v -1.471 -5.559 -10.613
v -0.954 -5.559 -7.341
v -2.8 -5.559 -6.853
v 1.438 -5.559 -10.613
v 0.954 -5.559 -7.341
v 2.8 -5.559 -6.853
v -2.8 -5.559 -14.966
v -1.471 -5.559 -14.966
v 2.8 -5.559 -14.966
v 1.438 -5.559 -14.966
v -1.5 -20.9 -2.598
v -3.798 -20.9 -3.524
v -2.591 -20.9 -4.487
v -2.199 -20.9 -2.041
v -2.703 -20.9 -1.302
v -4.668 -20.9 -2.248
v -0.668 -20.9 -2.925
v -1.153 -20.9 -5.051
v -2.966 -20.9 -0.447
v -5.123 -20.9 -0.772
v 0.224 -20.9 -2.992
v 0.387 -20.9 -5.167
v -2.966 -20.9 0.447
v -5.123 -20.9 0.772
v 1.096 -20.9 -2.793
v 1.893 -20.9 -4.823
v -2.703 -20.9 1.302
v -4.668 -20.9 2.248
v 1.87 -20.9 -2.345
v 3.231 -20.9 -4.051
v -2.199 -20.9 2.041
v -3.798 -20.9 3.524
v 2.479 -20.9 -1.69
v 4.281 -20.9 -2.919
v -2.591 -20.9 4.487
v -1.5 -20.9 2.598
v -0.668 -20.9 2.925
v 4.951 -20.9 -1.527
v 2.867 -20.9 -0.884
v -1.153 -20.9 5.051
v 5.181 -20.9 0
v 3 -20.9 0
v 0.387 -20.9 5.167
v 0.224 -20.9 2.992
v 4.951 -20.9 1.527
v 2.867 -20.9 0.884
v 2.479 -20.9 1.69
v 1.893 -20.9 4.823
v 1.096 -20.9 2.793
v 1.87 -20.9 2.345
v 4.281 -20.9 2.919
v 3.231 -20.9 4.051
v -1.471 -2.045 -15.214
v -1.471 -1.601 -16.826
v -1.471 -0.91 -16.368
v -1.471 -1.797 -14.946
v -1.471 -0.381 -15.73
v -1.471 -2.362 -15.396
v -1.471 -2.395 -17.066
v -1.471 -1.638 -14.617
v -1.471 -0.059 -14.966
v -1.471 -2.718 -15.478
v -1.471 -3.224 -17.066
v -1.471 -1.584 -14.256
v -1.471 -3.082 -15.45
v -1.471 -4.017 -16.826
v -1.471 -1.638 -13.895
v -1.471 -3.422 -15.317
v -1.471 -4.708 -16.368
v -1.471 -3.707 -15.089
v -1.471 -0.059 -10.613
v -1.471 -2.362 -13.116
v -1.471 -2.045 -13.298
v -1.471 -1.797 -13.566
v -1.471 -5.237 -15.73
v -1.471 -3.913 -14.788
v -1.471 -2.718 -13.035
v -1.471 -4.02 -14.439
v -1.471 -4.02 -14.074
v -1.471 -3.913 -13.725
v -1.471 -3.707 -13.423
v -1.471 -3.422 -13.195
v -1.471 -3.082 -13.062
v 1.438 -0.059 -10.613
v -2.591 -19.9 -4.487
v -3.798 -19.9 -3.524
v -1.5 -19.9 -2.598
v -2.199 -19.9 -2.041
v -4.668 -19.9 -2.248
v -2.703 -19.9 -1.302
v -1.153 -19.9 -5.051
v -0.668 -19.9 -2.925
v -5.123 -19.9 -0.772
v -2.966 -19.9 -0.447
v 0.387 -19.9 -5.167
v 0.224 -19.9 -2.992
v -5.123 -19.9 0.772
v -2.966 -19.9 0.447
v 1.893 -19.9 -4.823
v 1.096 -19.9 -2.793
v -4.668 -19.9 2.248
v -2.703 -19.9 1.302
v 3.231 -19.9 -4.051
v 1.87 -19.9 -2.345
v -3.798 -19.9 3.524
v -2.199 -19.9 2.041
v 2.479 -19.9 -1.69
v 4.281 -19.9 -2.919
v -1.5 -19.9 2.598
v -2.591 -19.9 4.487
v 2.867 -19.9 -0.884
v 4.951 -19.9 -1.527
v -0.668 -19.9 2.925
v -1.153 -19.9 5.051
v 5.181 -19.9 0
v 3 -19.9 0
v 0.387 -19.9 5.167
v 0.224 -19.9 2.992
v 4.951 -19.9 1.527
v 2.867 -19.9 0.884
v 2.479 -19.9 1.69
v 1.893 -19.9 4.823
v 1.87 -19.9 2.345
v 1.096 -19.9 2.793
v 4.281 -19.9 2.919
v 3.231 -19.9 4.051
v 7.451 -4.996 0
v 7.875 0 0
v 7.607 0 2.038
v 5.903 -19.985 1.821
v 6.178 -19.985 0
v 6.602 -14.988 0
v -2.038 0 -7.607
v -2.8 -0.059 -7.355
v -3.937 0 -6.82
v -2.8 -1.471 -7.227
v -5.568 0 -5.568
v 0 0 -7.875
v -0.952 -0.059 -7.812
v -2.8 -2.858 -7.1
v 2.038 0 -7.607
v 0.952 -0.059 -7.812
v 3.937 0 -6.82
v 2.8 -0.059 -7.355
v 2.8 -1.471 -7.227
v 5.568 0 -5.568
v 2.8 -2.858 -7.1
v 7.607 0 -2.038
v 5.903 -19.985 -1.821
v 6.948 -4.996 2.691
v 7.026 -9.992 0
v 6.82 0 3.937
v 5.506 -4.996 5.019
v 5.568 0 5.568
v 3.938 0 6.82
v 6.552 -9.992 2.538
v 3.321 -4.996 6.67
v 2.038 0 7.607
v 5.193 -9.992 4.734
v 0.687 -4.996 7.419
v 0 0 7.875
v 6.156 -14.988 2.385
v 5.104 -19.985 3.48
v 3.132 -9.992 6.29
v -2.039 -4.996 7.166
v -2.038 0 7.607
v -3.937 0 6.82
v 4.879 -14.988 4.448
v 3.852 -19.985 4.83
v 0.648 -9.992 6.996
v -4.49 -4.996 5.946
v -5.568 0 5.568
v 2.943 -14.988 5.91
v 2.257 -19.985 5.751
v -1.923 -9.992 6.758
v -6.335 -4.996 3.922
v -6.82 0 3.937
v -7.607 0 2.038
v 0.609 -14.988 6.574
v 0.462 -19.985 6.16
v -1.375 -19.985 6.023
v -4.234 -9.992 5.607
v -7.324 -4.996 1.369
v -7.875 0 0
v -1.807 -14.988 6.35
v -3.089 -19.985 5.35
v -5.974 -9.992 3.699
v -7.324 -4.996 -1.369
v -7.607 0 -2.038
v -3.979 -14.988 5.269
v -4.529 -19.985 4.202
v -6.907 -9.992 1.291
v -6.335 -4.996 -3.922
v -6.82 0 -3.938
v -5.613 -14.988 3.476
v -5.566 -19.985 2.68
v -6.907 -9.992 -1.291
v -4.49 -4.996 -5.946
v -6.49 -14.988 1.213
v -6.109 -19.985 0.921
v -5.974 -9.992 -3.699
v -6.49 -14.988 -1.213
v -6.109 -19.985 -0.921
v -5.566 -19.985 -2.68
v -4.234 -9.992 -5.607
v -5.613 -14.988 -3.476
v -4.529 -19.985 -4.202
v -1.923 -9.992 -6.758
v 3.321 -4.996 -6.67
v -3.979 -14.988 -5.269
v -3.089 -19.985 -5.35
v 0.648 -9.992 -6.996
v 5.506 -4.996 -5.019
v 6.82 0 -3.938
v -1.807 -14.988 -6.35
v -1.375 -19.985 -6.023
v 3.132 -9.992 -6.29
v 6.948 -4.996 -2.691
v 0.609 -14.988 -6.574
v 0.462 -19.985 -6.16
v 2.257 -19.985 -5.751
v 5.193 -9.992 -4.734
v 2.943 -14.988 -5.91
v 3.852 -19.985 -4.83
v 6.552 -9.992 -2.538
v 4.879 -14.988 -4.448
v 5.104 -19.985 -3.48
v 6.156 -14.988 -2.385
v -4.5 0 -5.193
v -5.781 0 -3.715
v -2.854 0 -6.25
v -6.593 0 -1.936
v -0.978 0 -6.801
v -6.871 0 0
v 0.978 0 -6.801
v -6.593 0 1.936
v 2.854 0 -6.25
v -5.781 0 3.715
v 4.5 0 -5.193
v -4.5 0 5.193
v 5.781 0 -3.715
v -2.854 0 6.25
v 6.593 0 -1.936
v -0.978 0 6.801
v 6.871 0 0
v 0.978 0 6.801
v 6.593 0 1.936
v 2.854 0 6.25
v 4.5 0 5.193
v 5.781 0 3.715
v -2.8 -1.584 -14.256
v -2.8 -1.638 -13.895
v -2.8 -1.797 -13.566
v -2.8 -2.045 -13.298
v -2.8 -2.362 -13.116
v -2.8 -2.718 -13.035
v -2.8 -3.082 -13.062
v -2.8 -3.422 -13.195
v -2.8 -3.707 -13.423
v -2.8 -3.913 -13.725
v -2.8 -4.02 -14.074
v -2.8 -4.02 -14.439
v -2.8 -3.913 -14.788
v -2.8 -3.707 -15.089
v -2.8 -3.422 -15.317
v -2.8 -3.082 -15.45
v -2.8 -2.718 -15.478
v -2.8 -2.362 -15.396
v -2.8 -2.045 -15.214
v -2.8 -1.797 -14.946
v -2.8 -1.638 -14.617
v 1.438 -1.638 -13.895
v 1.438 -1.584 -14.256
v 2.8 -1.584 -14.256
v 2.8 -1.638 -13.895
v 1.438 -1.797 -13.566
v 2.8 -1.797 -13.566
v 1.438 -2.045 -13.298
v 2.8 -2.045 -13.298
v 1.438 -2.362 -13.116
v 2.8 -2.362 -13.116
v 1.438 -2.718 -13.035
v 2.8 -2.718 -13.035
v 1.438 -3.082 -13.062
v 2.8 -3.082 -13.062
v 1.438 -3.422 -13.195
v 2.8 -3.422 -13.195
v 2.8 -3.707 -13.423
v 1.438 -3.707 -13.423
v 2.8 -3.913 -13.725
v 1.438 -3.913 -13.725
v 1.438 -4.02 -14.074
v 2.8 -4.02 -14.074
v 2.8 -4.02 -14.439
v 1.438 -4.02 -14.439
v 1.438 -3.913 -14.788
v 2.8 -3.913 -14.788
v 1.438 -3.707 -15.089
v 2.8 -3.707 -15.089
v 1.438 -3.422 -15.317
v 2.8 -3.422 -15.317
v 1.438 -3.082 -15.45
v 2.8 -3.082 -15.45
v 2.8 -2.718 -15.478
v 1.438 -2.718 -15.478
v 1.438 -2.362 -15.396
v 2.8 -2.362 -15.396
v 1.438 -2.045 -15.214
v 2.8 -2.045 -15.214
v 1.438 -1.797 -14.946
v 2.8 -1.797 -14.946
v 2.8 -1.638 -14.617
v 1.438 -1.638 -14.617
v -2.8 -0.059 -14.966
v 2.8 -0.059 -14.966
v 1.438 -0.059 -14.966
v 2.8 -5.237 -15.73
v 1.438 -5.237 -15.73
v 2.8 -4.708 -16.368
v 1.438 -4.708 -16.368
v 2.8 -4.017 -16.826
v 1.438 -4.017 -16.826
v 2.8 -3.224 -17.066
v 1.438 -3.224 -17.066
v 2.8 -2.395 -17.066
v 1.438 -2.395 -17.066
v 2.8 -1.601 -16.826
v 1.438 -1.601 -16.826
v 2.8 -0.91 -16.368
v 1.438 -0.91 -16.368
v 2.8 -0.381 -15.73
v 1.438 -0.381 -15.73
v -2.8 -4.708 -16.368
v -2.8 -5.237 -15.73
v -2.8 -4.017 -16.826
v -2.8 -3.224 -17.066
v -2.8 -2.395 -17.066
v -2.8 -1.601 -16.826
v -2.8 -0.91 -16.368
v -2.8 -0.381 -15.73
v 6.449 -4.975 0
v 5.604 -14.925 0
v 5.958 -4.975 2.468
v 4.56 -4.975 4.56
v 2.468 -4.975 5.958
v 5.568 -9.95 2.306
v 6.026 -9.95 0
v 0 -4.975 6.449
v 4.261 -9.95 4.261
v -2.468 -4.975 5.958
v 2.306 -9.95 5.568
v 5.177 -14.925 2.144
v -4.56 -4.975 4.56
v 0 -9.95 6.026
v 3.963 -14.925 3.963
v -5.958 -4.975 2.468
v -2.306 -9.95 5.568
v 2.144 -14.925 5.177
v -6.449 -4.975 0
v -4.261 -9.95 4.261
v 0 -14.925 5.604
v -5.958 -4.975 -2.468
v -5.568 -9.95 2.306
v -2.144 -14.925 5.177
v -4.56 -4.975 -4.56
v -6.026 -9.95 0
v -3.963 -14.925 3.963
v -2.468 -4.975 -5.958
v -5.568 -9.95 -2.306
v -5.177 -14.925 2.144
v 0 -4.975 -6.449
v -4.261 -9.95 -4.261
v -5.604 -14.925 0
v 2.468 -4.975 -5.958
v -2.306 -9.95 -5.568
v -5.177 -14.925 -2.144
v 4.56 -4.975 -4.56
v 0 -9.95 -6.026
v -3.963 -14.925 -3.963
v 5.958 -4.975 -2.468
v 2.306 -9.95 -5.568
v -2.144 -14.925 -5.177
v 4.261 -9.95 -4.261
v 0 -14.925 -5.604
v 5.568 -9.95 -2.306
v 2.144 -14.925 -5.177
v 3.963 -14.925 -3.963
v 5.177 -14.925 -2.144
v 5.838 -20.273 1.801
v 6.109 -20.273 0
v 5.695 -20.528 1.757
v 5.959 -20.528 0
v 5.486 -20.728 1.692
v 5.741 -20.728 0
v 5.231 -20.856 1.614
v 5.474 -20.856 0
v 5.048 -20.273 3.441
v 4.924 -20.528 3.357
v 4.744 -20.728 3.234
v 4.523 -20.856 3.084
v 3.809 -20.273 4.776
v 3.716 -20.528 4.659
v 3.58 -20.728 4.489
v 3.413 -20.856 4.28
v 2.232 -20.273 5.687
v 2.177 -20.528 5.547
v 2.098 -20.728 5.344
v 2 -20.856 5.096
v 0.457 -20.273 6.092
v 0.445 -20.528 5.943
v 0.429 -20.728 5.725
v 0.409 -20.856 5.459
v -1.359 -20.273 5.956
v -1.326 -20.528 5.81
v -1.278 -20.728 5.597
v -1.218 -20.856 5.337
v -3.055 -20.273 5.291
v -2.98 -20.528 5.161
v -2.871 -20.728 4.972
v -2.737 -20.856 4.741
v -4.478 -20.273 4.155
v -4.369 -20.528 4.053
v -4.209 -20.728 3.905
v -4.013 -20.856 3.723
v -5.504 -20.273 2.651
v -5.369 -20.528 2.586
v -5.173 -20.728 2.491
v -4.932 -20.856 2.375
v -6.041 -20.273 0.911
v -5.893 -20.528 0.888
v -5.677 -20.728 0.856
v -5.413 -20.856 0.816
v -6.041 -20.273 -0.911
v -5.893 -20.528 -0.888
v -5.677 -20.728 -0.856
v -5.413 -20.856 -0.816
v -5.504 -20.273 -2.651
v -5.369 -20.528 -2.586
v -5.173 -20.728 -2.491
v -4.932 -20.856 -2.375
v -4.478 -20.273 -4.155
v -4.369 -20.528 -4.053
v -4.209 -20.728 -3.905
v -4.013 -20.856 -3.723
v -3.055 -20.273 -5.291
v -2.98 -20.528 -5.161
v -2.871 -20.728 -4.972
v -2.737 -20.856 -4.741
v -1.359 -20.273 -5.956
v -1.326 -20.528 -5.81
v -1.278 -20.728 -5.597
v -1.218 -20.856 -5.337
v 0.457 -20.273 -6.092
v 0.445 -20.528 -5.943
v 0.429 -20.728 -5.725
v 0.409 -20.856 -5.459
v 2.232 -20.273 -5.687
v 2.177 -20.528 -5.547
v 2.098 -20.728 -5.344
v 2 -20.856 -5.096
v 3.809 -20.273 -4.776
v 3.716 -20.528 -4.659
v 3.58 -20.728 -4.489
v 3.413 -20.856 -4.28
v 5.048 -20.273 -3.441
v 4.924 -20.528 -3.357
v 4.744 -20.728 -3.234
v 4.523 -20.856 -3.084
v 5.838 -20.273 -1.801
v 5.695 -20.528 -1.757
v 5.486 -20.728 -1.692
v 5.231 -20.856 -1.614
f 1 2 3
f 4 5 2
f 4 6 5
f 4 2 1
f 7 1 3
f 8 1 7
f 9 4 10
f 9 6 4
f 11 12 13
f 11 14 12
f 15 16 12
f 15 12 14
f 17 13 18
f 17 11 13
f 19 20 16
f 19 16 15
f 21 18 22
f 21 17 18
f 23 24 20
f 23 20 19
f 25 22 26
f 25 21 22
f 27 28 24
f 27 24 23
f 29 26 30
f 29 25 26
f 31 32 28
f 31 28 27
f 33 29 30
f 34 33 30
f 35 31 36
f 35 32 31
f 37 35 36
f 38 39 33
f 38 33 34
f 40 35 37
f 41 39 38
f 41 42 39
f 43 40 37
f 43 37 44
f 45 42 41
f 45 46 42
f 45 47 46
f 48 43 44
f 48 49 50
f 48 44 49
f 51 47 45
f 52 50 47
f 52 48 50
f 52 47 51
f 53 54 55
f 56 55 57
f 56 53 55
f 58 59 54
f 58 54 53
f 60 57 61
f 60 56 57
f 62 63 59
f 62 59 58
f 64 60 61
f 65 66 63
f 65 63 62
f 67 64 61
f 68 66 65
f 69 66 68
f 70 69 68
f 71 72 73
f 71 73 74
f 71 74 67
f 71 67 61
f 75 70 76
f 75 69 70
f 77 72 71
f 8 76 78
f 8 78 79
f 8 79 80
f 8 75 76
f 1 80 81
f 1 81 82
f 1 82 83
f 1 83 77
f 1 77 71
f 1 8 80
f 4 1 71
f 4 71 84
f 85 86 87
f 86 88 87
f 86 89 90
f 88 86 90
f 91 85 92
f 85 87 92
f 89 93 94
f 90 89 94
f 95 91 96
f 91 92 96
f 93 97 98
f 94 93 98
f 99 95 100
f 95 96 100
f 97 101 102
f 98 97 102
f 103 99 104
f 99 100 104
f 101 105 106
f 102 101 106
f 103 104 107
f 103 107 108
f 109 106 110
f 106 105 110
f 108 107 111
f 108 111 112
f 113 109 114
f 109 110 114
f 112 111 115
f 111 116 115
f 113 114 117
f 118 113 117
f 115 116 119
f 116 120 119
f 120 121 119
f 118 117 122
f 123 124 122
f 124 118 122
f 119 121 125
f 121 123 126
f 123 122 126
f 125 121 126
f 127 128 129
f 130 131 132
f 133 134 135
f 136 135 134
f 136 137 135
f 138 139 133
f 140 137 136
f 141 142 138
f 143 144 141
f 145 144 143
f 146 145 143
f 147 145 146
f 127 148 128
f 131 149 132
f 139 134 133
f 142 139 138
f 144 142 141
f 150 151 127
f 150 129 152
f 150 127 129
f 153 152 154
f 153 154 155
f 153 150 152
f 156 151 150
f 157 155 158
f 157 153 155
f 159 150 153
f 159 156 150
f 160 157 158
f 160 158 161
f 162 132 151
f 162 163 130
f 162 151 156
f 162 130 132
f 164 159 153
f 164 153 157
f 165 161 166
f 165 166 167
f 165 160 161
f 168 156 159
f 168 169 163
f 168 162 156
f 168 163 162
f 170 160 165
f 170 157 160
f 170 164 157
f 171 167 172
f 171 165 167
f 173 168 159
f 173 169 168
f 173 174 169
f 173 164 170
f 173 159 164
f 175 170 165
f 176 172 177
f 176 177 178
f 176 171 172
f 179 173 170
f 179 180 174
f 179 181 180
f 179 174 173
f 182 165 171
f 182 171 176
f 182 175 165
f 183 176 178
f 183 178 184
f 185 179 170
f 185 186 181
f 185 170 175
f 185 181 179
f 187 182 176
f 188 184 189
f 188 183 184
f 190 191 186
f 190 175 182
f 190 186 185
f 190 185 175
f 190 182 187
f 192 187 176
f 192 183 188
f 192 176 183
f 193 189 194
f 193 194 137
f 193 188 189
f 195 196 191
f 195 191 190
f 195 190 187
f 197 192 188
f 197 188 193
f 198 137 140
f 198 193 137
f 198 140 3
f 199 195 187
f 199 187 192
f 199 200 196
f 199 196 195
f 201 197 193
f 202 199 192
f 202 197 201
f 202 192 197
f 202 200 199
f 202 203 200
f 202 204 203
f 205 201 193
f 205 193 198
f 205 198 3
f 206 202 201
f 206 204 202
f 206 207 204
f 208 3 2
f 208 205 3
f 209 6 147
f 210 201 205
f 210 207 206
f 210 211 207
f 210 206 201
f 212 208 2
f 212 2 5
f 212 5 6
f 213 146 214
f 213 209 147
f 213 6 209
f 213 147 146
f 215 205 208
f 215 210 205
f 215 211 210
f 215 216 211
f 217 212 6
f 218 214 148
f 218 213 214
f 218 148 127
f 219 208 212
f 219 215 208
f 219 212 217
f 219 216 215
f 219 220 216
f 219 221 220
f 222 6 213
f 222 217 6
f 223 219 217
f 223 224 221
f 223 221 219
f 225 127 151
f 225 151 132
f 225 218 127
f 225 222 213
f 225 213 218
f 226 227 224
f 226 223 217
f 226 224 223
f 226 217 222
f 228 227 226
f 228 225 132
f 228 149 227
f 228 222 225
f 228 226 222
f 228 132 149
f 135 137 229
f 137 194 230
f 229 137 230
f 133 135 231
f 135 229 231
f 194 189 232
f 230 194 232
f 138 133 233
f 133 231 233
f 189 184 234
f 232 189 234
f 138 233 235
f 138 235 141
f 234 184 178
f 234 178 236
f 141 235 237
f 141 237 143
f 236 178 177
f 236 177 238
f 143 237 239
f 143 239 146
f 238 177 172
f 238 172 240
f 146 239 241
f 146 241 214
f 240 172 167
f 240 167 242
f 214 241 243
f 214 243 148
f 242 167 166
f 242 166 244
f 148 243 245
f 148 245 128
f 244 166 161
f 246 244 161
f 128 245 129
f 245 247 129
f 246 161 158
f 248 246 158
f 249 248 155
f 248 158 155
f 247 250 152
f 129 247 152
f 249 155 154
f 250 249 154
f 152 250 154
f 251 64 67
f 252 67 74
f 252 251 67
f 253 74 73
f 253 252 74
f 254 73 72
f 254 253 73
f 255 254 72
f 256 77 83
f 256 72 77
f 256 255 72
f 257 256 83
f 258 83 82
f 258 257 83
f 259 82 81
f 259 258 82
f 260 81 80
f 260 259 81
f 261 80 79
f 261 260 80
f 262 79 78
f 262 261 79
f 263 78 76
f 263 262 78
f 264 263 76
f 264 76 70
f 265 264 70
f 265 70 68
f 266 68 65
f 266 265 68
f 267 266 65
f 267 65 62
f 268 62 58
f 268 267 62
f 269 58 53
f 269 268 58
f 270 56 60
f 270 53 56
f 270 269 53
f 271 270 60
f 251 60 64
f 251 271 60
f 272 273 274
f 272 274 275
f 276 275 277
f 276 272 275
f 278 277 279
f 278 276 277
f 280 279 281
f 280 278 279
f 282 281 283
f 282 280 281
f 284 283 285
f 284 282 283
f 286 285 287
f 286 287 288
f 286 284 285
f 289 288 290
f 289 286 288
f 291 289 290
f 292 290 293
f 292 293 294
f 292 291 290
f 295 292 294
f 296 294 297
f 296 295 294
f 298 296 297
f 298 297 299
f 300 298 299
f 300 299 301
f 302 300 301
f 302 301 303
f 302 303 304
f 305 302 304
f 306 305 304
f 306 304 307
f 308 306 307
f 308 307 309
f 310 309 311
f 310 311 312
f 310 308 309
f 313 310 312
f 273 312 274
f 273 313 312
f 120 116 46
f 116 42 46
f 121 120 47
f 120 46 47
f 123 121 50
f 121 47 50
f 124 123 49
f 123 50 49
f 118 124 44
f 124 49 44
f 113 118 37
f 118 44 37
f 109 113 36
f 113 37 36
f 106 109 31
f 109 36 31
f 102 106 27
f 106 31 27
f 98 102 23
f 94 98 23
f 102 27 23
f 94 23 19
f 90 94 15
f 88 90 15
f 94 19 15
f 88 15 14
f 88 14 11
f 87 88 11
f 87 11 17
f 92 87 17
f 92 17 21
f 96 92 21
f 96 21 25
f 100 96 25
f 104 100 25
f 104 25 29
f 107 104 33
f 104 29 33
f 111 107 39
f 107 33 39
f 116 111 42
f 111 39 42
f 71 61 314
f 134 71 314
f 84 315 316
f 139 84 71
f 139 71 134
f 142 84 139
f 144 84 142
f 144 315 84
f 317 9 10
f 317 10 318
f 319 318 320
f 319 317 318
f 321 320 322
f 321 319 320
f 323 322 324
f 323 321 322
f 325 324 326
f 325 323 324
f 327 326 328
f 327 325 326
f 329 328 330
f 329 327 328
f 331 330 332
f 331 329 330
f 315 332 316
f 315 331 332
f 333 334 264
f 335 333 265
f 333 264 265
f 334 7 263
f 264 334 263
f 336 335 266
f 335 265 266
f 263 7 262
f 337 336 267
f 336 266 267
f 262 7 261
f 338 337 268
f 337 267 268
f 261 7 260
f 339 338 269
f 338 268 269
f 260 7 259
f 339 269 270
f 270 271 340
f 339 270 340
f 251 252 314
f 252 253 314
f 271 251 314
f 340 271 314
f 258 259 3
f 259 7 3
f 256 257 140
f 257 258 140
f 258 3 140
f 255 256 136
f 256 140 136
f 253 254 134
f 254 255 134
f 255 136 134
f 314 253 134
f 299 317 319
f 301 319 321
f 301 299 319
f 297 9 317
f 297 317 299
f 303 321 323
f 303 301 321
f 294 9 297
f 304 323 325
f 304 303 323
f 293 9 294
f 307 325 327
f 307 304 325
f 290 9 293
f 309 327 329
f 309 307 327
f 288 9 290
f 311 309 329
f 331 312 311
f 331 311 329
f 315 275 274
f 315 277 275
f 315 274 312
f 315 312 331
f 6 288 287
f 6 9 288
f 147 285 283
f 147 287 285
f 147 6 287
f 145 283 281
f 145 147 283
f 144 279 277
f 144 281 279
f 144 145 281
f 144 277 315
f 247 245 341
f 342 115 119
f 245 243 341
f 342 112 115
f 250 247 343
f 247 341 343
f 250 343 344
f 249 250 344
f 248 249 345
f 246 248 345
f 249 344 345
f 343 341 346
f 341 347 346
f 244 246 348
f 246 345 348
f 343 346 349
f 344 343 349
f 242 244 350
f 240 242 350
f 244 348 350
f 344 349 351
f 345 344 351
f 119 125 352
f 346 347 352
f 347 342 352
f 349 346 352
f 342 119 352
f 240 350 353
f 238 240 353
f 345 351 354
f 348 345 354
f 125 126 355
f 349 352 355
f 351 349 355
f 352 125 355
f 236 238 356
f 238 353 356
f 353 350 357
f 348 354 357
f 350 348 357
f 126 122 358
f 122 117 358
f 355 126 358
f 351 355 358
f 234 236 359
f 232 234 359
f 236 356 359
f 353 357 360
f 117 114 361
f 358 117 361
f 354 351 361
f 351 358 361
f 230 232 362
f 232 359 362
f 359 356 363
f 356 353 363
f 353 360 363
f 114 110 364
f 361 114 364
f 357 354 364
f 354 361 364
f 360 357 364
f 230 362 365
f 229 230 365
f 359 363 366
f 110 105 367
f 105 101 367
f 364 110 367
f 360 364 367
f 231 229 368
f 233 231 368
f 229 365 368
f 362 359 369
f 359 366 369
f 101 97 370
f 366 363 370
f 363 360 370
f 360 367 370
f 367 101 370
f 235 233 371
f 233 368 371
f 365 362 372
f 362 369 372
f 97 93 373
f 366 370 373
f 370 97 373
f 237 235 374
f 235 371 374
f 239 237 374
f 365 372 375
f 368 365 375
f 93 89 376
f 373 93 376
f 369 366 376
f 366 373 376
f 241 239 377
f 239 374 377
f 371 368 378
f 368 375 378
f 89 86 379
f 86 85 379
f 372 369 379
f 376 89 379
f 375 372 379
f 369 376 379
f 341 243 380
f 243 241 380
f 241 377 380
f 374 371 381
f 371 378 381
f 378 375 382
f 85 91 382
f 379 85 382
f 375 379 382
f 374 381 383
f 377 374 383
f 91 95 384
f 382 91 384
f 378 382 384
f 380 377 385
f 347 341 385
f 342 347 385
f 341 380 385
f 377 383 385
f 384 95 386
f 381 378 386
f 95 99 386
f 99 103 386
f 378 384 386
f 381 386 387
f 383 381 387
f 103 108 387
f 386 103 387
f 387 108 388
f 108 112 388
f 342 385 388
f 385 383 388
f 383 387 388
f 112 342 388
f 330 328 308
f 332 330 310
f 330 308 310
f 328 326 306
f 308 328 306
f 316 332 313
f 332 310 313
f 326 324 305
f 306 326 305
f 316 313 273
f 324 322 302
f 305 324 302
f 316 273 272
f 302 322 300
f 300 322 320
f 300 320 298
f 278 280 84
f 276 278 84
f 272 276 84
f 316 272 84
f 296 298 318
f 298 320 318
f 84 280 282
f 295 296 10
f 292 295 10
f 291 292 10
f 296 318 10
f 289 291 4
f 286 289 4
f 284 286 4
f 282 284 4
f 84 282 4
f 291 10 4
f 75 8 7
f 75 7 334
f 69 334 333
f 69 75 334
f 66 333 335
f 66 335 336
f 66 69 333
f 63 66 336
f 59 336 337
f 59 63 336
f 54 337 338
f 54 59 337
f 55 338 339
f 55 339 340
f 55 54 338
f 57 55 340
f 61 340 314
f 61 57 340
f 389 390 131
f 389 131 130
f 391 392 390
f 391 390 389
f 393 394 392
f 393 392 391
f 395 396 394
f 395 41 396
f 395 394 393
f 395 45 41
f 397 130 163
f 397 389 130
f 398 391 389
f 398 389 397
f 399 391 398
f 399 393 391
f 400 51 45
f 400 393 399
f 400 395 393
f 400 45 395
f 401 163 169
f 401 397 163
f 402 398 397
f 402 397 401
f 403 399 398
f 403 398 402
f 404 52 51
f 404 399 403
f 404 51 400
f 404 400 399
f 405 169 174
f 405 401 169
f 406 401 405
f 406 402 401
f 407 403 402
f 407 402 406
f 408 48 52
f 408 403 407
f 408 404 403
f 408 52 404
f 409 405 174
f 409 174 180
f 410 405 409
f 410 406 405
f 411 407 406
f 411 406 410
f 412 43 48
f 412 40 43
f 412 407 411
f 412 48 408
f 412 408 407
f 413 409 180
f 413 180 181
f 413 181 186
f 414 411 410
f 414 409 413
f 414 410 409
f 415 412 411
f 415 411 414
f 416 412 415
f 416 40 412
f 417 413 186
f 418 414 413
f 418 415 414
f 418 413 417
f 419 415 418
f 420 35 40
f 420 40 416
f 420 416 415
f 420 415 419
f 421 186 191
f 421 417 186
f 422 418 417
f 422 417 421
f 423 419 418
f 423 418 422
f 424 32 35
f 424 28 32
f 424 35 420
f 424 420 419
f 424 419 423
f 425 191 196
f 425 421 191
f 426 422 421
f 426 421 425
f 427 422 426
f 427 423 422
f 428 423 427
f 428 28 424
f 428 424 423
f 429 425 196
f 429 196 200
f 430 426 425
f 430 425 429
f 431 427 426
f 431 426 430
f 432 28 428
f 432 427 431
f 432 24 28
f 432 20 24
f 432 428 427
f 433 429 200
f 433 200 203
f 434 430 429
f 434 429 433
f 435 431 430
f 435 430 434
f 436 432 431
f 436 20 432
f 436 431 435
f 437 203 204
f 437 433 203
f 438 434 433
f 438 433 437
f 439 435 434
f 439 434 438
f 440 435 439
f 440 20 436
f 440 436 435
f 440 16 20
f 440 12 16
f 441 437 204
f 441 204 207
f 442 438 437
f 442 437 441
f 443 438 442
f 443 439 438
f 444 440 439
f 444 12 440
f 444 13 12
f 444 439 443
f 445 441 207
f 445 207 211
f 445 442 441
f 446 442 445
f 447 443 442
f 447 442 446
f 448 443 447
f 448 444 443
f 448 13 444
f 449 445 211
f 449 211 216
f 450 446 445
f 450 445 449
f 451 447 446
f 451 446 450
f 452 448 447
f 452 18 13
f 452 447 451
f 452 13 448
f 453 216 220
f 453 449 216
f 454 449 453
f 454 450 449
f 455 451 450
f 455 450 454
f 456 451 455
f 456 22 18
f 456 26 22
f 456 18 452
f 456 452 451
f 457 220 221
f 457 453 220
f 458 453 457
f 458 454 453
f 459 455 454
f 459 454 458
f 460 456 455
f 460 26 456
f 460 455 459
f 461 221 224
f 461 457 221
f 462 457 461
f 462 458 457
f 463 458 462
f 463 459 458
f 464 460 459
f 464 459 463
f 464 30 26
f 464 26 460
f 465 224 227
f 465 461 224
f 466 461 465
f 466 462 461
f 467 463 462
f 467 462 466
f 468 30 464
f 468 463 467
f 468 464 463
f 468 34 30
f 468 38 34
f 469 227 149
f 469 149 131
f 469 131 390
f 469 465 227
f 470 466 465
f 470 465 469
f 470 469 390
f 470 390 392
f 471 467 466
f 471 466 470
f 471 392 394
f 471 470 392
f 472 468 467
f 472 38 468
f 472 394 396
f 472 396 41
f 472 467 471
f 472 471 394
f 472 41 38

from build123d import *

# Parameters (mm, degrees)
F0_R      = 7.875
F2_R      = 6.1
F4_T      = -1
F5_R      = 3
F6_DEPTH  = 12.5
F7_R      = 1.225
F8_DEPTH  = 2.8
F9_W      = 2.908817606
F9_H      = 7.2918525926
F10_DEPTH = 20.9010001
F11_R     = 1


with BuildPart() as f3:
    # F0 (on Front) → F3 section 0
    with BuildSketch(Plane.XZ):
        Circle(F0_R)
    # F2 (on offset) → F3 section 1
    with BuildSketch(Plane.XZ.offset(20.9)):
        Circle(F2_R)
    loft()

    # F4
    f4_openings = [f3.faces().sort_by_distance(p)[0] for p in [
        (0, 0, 0),
    ]]
    offset(amount=F4_T, openings=f4_openings, kind=Kind.INTERSECTION)

    # F5 (on offset) → F6 (cut, symmetric)
    with BuildSketch(Plane.XZ.offset(20.9)):
        Circle(F5_R)
    extrude(amount=F6_DEPTH, both=True, mode=Mode.SUBTRACT)

    # F7 (on Right) → F8 (join, symmetric)
    with BuildSketch(Plane.YZ):
        with BuildLine():
            Line((-5.5590723408, -6.6040260717), (-5.5590723408, -14.9660339587))
            ThreePointArc((-5.5590723408, -14.9660339587), (-2.8090723408, -17.0962775531), (-0.0590723408, -14.9660339587))
            Line((-0.0590723408, -14.9660339587), (-0.0590723408, -7.0811193436))
            Line((-0.0590723408, -7.0811193436), (-5.5590723408, -6.6040260717))
        make_face()
        with Locations((-2.8090723408, -14.256124013)):
            Circle(F7_R, mode=Mode.SUBTRACT)
    extrude(amount=F8_DEPTH, both=True)

    # F9 (on offset) → F10 (cut, through all)
    with BuildSketch(Plane.XZ.offset(20.9)):
        with Locations((-0.016908803, -14.2587911789)):
            Rectangle(F9_W, F9_H)
    extrude(amount=-F10_DEPTH, mode=Mode.SUBTRACT)

    # F11
    f11_edges = [f3.edges().sort_by_distance(p)[0] for p in [
        (-6.1, -20.9, 0),
    ]]
    fillet(f11_edges, radius=F11_R)


solid = f3.part
